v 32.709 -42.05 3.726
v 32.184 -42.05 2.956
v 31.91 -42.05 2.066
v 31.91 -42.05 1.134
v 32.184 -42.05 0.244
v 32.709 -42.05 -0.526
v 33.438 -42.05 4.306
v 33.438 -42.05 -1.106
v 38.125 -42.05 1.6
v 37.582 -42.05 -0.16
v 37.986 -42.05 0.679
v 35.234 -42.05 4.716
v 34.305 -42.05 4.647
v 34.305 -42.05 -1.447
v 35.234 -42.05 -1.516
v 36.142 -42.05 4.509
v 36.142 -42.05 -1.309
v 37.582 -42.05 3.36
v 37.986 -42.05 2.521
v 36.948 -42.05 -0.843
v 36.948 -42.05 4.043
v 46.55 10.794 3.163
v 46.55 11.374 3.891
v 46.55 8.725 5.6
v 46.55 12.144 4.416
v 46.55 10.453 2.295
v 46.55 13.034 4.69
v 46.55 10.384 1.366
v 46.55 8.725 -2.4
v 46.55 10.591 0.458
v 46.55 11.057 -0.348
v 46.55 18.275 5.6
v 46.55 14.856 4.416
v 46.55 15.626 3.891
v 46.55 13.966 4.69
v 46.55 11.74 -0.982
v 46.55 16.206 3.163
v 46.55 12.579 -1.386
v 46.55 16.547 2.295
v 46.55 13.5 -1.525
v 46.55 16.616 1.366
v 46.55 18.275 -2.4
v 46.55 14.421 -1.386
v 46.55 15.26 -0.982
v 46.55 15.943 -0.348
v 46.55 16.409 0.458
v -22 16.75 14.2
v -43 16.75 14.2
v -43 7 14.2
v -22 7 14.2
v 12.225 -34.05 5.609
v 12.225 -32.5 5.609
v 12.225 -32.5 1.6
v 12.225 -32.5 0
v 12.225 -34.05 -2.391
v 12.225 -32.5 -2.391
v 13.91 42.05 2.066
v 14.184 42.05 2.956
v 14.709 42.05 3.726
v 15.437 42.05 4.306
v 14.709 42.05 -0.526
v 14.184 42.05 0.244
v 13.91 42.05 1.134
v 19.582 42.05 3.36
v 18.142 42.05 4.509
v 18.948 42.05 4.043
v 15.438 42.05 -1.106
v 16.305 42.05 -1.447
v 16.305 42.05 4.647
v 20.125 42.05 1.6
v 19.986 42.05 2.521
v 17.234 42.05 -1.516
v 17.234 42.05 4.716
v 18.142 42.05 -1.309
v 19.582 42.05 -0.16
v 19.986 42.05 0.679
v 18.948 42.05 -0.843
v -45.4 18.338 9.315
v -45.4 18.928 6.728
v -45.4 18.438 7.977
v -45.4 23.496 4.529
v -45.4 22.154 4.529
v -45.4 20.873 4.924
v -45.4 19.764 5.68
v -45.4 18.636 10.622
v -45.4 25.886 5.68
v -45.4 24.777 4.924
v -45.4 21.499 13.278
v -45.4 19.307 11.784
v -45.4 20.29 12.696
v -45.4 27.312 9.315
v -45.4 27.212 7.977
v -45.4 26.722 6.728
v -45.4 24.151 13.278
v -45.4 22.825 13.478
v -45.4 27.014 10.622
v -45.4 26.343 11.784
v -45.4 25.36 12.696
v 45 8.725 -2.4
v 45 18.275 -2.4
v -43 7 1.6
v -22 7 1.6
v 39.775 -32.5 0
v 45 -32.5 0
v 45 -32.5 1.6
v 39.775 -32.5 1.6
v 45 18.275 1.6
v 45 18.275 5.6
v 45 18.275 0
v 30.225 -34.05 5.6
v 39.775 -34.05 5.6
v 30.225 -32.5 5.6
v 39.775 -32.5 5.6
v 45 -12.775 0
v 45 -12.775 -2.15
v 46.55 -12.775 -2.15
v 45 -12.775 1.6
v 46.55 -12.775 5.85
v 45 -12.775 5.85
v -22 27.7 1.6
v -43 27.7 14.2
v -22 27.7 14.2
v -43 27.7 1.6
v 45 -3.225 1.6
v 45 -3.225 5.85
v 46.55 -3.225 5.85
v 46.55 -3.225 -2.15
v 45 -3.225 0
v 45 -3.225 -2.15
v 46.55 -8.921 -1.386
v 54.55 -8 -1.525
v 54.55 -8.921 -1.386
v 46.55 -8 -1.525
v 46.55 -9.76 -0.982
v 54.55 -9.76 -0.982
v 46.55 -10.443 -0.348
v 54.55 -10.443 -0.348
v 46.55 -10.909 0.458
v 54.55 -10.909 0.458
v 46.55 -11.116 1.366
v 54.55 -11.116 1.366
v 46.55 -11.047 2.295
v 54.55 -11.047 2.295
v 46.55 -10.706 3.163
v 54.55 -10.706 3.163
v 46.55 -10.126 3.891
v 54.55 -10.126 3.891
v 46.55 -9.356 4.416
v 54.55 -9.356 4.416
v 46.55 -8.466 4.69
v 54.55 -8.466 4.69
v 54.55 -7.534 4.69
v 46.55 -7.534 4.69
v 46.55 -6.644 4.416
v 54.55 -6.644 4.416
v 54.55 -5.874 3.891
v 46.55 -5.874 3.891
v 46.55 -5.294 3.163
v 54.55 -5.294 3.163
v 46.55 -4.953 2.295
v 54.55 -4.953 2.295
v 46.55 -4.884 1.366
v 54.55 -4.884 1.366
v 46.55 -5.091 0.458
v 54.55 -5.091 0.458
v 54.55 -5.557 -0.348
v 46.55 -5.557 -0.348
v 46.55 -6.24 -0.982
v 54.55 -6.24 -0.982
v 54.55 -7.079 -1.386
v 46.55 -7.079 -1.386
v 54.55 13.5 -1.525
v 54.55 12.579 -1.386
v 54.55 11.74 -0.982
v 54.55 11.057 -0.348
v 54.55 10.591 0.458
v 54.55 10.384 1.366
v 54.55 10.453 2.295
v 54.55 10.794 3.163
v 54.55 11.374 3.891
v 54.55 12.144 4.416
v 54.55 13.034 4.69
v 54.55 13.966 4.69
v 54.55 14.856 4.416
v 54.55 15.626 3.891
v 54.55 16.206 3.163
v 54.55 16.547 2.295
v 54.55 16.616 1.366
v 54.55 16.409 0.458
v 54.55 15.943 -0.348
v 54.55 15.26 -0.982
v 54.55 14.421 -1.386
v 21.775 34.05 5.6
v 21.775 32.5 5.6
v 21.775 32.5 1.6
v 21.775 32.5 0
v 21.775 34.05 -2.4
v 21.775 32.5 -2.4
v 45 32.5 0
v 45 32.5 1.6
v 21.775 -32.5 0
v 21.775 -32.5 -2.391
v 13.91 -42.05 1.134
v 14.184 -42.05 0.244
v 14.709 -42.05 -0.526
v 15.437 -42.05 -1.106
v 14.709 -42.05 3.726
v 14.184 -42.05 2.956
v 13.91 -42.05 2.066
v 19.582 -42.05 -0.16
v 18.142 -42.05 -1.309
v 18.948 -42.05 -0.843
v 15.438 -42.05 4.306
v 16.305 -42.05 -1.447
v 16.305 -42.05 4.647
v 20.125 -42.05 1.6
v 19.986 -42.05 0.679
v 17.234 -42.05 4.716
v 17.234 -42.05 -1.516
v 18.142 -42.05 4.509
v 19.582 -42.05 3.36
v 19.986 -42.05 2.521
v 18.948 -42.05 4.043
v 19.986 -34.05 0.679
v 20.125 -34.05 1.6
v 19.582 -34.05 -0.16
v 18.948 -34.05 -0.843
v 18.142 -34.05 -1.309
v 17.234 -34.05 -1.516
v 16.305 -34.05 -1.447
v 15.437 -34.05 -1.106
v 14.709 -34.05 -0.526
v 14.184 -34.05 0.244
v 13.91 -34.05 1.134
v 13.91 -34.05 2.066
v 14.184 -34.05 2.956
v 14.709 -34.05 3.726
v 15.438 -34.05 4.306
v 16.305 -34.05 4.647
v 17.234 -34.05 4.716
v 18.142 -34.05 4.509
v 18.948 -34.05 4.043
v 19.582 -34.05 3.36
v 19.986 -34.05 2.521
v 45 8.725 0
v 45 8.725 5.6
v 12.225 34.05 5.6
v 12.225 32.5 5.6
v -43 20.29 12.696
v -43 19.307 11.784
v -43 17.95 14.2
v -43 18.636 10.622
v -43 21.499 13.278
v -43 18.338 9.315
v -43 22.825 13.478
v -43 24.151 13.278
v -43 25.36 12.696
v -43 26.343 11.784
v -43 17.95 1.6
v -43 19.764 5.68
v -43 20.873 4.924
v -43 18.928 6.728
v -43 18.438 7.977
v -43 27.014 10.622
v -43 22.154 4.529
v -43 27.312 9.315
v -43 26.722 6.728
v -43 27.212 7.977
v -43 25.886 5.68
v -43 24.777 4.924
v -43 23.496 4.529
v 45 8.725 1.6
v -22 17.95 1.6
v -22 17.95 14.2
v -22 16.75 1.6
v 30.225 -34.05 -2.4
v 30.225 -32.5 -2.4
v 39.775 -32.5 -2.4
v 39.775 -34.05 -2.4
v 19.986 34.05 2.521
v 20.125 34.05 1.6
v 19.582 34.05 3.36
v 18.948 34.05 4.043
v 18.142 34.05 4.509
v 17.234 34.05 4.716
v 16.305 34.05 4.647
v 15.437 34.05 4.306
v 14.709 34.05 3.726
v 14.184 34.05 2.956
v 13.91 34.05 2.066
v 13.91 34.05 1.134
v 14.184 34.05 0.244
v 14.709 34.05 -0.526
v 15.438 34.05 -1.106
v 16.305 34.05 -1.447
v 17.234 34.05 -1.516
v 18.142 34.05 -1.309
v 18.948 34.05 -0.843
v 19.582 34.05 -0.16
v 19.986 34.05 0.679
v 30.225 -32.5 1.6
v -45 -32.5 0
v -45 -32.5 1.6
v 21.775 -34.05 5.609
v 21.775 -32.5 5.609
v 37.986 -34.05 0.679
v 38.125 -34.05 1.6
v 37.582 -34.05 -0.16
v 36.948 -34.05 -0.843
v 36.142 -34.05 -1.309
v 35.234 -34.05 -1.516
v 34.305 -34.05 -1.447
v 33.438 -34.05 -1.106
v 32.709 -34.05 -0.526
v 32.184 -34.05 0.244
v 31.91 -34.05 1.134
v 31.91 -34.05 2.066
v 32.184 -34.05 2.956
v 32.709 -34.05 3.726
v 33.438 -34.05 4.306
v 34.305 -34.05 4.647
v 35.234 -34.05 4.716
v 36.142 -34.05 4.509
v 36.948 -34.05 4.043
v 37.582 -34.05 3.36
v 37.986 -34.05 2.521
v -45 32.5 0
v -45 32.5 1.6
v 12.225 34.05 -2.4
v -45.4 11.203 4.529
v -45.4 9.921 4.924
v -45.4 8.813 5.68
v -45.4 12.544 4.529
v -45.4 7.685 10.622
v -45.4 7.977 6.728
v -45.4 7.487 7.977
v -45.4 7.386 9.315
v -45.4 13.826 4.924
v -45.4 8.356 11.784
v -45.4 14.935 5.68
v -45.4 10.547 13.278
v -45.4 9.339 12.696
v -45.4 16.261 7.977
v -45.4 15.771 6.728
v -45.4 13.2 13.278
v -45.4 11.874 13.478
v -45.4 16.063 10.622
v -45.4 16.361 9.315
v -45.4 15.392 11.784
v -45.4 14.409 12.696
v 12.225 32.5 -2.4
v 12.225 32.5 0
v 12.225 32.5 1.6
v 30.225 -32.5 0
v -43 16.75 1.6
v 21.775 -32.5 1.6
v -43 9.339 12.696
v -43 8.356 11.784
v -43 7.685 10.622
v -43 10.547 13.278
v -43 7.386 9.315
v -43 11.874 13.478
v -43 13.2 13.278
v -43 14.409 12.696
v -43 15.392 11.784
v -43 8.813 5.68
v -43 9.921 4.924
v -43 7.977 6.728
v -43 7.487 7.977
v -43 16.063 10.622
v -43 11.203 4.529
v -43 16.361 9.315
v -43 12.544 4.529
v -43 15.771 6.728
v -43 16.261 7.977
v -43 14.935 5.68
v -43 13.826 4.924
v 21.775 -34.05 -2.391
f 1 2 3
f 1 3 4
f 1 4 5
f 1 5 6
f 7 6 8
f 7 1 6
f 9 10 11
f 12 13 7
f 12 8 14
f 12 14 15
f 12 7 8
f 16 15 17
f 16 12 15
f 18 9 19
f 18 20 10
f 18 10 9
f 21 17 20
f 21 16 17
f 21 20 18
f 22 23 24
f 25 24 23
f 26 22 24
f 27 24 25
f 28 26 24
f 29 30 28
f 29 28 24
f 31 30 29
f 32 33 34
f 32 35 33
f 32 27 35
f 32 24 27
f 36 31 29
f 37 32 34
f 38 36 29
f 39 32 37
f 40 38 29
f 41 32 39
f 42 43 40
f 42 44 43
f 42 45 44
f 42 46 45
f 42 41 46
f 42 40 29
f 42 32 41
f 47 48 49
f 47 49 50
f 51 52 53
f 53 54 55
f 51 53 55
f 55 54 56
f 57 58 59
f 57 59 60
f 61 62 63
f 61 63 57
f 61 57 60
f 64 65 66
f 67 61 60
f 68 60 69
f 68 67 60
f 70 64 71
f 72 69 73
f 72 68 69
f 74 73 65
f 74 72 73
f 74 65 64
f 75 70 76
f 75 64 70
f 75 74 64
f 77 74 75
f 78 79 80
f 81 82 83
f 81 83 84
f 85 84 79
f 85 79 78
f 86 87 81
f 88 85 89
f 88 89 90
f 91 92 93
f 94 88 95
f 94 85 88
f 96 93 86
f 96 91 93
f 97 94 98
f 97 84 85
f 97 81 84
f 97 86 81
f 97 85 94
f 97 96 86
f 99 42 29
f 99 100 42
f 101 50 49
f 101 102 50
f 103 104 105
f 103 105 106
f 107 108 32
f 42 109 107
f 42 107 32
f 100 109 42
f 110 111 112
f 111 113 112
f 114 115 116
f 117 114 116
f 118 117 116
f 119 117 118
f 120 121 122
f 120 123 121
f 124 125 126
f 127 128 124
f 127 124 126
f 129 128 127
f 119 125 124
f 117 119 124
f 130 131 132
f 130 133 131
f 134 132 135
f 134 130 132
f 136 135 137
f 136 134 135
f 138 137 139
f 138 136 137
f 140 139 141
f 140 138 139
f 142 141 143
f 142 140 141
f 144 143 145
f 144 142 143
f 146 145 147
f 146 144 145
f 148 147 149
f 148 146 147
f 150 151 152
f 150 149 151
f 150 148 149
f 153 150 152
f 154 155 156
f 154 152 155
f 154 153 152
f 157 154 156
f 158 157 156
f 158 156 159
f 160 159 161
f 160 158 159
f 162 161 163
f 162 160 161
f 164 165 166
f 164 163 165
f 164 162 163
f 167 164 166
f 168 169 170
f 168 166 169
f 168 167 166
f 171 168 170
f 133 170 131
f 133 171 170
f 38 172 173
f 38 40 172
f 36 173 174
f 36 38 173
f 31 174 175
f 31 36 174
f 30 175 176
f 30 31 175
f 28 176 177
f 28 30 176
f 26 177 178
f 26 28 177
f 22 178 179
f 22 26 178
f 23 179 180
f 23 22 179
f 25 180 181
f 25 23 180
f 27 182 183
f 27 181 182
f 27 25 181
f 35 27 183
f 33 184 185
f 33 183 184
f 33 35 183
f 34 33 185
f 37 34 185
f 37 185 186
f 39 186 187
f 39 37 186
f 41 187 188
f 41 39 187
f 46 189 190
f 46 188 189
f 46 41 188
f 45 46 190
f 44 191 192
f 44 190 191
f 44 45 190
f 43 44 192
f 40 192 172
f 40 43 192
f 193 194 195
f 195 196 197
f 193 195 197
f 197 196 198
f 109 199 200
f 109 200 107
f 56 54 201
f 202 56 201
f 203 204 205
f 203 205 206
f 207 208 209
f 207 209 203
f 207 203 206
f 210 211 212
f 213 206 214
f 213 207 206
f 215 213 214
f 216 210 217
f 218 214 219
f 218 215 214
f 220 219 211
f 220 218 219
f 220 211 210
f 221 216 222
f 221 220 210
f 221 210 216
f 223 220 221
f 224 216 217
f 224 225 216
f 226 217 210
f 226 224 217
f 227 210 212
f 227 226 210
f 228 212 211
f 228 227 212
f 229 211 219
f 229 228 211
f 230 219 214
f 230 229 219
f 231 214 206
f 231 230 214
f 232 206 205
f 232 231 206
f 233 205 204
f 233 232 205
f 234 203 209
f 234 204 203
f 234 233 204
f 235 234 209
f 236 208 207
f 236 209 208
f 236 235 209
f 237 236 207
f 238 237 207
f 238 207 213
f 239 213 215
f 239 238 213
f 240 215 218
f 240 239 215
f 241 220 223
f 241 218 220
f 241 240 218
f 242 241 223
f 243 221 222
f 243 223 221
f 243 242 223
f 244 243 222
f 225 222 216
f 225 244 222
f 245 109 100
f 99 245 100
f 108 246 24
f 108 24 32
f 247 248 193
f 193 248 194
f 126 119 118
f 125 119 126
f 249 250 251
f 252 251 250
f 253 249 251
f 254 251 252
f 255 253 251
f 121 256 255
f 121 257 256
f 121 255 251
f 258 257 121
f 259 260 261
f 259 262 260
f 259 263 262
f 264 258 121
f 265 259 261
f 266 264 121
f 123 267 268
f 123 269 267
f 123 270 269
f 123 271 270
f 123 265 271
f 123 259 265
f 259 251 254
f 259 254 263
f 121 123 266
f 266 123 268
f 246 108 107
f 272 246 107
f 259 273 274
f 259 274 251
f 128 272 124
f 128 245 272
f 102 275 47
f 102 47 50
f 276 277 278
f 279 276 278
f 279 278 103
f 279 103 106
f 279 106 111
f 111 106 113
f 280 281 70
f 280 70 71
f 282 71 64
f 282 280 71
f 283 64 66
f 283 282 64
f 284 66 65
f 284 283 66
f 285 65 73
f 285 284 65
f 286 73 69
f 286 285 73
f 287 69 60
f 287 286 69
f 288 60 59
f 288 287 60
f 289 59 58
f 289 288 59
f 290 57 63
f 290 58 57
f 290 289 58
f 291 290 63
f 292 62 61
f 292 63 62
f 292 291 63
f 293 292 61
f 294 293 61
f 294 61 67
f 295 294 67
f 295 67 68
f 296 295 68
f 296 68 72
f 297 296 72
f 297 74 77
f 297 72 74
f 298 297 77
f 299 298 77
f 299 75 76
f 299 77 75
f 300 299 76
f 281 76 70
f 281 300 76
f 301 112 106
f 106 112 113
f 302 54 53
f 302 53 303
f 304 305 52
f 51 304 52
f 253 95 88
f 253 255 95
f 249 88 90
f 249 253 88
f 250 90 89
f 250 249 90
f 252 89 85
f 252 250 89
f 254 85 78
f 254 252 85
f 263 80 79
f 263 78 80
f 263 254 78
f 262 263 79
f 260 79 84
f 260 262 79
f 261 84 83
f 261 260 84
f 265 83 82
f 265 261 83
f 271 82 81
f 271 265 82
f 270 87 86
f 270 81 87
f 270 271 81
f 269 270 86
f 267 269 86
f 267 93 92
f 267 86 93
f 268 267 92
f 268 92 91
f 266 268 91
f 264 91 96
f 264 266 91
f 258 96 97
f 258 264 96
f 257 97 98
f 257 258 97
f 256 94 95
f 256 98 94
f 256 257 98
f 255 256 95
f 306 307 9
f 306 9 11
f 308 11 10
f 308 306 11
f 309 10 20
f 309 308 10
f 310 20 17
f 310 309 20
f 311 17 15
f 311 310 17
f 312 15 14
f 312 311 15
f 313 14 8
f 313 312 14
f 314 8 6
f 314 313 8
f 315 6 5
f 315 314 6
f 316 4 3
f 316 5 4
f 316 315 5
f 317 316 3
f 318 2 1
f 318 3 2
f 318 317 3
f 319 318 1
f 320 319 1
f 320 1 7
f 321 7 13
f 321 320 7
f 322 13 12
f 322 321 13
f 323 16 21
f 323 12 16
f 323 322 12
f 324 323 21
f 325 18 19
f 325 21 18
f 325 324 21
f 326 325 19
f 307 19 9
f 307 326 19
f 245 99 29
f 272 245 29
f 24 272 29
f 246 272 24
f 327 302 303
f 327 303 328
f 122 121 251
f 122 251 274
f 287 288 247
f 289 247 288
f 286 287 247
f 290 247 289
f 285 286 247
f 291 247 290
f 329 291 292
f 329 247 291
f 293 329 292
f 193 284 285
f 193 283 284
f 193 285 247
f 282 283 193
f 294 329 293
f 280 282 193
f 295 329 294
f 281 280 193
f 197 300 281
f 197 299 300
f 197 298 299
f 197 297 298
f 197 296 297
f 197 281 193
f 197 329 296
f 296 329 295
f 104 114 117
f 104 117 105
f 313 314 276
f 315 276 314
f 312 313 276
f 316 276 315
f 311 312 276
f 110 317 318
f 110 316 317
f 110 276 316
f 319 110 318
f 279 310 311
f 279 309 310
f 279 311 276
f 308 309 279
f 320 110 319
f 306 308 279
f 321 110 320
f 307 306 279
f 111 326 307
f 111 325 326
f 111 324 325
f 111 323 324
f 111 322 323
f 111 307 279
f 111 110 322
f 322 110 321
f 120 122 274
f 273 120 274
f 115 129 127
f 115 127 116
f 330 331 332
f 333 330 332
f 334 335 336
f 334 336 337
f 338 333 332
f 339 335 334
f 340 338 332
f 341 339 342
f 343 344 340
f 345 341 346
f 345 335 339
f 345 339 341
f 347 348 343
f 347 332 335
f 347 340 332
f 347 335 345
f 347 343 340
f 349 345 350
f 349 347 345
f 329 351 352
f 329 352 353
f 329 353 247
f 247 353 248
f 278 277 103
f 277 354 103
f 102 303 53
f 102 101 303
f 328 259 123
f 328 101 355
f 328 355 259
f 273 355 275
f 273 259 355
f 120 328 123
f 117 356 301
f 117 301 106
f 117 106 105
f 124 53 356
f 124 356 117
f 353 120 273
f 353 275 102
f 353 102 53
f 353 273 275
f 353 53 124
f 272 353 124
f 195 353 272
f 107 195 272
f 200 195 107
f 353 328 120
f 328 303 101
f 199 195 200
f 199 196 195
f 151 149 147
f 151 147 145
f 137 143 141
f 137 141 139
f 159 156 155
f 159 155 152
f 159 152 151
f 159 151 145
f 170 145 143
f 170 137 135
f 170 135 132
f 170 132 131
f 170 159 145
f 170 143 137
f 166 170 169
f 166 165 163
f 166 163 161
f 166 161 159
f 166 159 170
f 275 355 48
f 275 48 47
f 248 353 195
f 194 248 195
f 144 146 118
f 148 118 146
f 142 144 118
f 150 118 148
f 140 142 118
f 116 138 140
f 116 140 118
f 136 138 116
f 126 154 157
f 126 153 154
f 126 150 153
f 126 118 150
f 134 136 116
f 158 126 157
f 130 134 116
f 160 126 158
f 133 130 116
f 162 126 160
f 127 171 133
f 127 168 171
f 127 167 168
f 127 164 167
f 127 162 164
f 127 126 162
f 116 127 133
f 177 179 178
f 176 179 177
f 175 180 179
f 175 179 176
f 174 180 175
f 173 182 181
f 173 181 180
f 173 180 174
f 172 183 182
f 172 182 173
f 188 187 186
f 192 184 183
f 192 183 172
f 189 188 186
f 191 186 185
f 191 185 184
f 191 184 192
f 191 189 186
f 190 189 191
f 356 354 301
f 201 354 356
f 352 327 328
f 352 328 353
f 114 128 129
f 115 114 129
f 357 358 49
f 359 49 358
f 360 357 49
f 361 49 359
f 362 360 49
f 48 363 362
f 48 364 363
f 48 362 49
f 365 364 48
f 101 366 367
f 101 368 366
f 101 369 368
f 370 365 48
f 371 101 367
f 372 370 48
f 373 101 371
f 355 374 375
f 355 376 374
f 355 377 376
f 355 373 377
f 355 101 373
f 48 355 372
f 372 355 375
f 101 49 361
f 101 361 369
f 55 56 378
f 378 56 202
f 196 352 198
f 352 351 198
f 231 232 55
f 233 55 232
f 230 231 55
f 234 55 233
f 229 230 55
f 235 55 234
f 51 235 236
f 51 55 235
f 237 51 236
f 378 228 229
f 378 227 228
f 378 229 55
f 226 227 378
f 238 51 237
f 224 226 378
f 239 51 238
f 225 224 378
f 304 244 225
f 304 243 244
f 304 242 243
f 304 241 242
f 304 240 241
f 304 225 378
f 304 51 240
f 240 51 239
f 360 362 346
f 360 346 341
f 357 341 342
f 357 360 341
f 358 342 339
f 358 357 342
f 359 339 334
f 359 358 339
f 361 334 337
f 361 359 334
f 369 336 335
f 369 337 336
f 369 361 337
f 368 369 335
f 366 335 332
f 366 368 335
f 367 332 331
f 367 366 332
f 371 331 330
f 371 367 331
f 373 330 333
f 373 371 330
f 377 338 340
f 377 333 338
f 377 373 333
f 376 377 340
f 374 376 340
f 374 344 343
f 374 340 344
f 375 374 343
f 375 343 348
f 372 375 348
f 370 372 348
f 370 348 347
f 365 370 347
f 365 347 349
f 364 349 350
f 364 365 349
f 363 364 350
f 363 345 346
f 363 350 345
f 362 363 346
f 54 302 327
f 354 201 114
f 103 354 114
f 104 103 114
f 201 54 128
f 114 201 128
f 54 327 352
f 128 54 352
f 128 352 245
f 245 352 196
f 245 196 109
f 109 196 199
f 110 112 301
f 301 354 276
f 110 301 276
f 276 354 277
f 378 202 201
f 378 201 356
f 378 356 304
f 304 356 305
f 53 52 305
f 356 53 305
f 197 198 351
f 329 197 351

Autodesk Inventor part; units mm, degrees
ref_plane "YZ Plane" through (0, 0, 0) normal (1, 0, 0) x (0, 1, 0)
ref_plane "XZ Plane" through (0, 0, 0) normal (0, 1, 0) x (-1, 0, 0)
ref_plane "XY Plane" through (0, 0, 0) normal (0, 0, 1) x (1, 0, 0)
sketch "Sketch1" plane through (0, 0, 0) normal (0, 0, 1) x (1, 0, 0)
  line L0 (-45, 32.5) -> (45, 32.5)
  line L1 (45, 32.5) -> (45, -32.5)
  line L2 (45, -32.5) -> (-45, -32.5)
  line L3 (-45, -32.5) -> (-45, 32.5)
  line L4 (-45, 32.5) -> (45, -32.5) construction
  line L5 (45, 32.5) -> (-45, -32.5) construction
  point P0 (0, 0)
  dimension "d0" = 90
  dimension "d1" = 65
extrude "Extrusion1" add sketch "Sketch1" along normal blind 1.6
sketch "Sketch2" plane through (0, 0, 1.6) normal (0, 0, 1) x (1, 0, 0)
  point P0 (0, 0)
sketch "Sketch3" plane through (-45, 32.5, 0) normal (0, 1, 0) x (1, 0, 0)
  point P0 (45, 0)
sketch "Sketch4" plane through (-45, 32.5, 0) normal (0, 1, 0) x (1, 0, 0)
  line L0 (57.225, -5.6) -> (66.775, -5.6)
  line L1 (66.775, -5.6) -> (66.775, 2.4)
  line L2 (66.775, 2.4) -> (57.225, 2.4)
  line L3 (57.225, 2.4) -> (57.225, -5.6)
  line L4 (90, -1.6) -> (0, -1.6) projected
  line L5 (57.225, -5.6) -> (66.775, 2.4) construction
  line L6 (66.775, -5.6) -> (57.225, 2.4) construction
  point P0 (45, 0)
  point P1 (62, -1.6)
  dimension "d4" = 9.55
  dimension "d5" = 8
  dimension "d8" = 62
extrude "Extrusion2" add sketch "Sketch4" along normal blind 1.55
sketch "Sketch5" plane through (45, -32.5, 0) normal (1, 0, 0) x (0, 0, -1)
  line L0 (-5.6, 50.775) -> (2.4, 50.775)
  line L1 (2.4, 50.775) -> (2.4, 41.225)
  line L2 (2.4, 41.225) -> (-5.6, 41.225)
  line L3 (-5.6, 41.225) -> (-5.6, 50.775)
  line L4 (-1.6, 0) -> (-1.6, 65) projected
  line L5 (-5.6, 50.775) -> (2.4, 41.225) construction
  line L6 (2.4, 50.775) -> (-5.6, 41.225) construction
  line L7 (-5.8505, 29.275) -> (2.1495, 29.275)
  line L8 (2.1495, 29.275) -> (2.1495, 19.725)
  line L9 (2.1495, 19.725) -> (-5.8505, 19.725)
  line L10 (-5.8505, 19.725) -> (-5.8505, 29.275)
  line L11 (-5.8505, 29.275) -> (2.1495, 19.725) construction
  line L12 (2.1495, 29.275) -> (-5.8505, 19.725) construction
  point P0 (0, 32.5)
  point P1 (-1.6, 46)
  point P2 (-1.8505, 24.5)
  dimension "d9" = 9.55
  dimension "d10" = 8
  dimension "d11" = 19
  dimension "d12" = 24.5
extrude "Extrusion3" add sketch "Sketch5" along normal blind 1.55
sketch "Sketch6" plane through (-45, -32.5, 0) normal (0, -1, 0) x (1, 0, 0)
  line L0 (66.775, 5.6091) -> (57.225, 5.6091)
  line L1 (57.225, 5.6091) -> (57.225, -2.3909)
  line L2 (57.225, -2.3909) -> (66.775, -2.3909)
  line L3 (66.775, -2.3909) -> (66.775, 5.6091)
  line L4 (66.775, 5.6091) -> (57.225, -2.3909) construction
  line L5 (57.225, 5.6091) -> (66.775, -2.3909) construction
  line L6 (84.775, 5.6) -> (75.225, 5.6)
  line L7 (75.225, 5.6) -> (75.225, -2.4)
  line L8 (75.225, -2.4) -> (84.775, -2.4)
  line L9 (84.775, -2.4) -> (84.775, 5.6)
  line L10 (0, 1.6) -> (90, 1.6) projected
  line L11 (84.775, 5.6) -> (75.225, -2.4) construction
  line L12 (75.225, 5.6) -> (84.775, -2.4) construction
  point P0 (45, 0)
  point P1 (62, 1.6091)
  point P2 (80, 1.6)
  dimension "d15" = 10
  dimension "d16" = 28
  dimension "d17" = 8
  dimension "d18" = 9.55
extrude "Extrusion4" add sketch "Sketch6" along normal blind 1.55
sketch "Sketch7" plane through (0, 0, 1.6) normal (0, 0, 1) x (1, 0, 0)
  line L0 (-43, 27.7) -> (-22, 27.7)
  line L1 (-22, 27.7) -> (-22, 17.95)
  line L2 (-22, 17.95) -> (-43, 17.95)
  line L3 (-43, 17.95) -> (-43, 27.7)
  line L4 (-43, 27.7) -> (-22, 17.95) construction
  line L5 (-22, 27.7) -> (-43, 17.95) construction
  line L6 (-43, 16.75) -> (-22, 16.75)
  line L7 (-22, 16.75) -> (-22, 7)
  line L8 (-22, 7) -> (-43, 7)
  line L9 (-43, 7) -> (-43, 16.75)
  line L10 (-43, 16.75) -> (-22, 7) construction
  line L11 (-22, 16.75) -> (-43, 7) construction
  line L12 (12.225, 32.5) -> (-45, 32.5) projected
  line L13 (-45, 32.5) -> (-45, -32.5) projected
  point P0 (0, 0)
  point P1 (-32.5, 22.825)
  point P2 (-32.5, 11.875)
  dimension "d21" = 21
  dimension "d22" = 9.75
  dimension "d23" = 25.5
  dimension "d24" = 4.8
  dimension "d25" = 2
extrude "Extrusion5" add sketch "Sketch7" along normal blind 12.6
sketch "Sketch8" plane through (-43, 17.95, 1.6) normal (-1, 0, 0) x (0, 0, 1)
  circle A0 centre (7.3783, 4.875) radius 4.5
  circle A1 centre (7.3783, -6.0762) radius 4.5
  point P0 (-1.6, -17.95)
  dimension "d28" = 9
extrude "Extrusion6" add sketch "Sketch8" along normal blind 2.4
sketch "Sketch9" plane through (-45, -34.05, 0) normal (0, -1, 0) x (1, 0, 0)
  line L0 (66.775, 5.6091) -> (57.225, 5.6091) construction
  line L1 (62, 5.6091) -> (62, -2.3909) construction
  line L2 (57.225, -2.3909) -> (66.775, -2.3909) construction
  line L3 (57.225, 1.6) -> (66.775, 1.6) construction
  line L4 (57.225, 1.6) -> (66.775, 1.6) construction
  line L5 (84.775, 5.6) -> (75.225, 5.6) construction
  line L6 (80, 5.6) -> (80, -3.4898) construction
  line L7 (75.225, 0) -> (75.225, 1.6) construction
  line L8 (75.225, 1.6) -> (84.775, 1.6) construction
  line L9 (75.225, 1.6) -> (84.775, 1.6) construction
  circle A0 centre (62, 1.6) radius 3.125
  circle A1 centre (80, 1.6) radius 3.125
  point P0 (45, 0)
  dimension "d31" = 6.25
extrude "Extrusion7" add sketch "Sketch9" along normal blind 8
sketch "Sketch10" plane through (46.55, -32.5, 0) normal (1, 0, 0) x (0, 0, -1)
  line L0 (-5.6, 50.775) -> (-5.6, 41.225) construction
  line L1 (-5.6, 46) -> (2.4, 46) construction
  line L2 (2.4, 41.225) -> (2.4, 50.775) construction
  line L3 (-5.8505, 29.275) -> (-5.8505, 19.725) construction
  line L4 (-5.8505, 24.5) -> (2.1495, 24.5) construction
  line L5 (2.1495, 29.275) -> (2.1495, 19.725) construction
  line L6 (-1.6, 50.775) -> (0, 50.775) construction
  line L7 (-1.6, 39.5) -> (-1.6, 49.25) construction
  line L8 (-1.6, 50.775) -> (-1.6, 39.5) construction
  line L9 (-1.6, 65) -> (-1.6, 0) construction
  line L10 (-1.6, 29.275) -> (-1.6, 19.725) construction
  circle A0 centre (-1.6, 46) radius 3.125
  circle A1 centre (-1.6, 24.5) radius 3.125
  point P0 (0, 32.5)
  dimension "d34" = 6.25
extrude "Extrusion8" add sketch "Sketch10" along normal blind 8
sketch "Sketch11" plane through (-45, 34.05, 0) normal (0, 1, 0) x (1, 0, 0)
  line L0 (66.775, -5.6091) -> (57.225, -5.6091) construction
  line L1 (62, -5.6091) -> (62, 2.3909) construction
  line L2 (57.225, 2.3909) -> (66.775, 2.3909) construction
  line L3 (57.225, -1.6) -> (66.775, -1.6) construction
  line L4 (57.225, -1.6) -> (66.775, -1.6) construction
  circle A0 centre (62, -1.6) radius 3.125
  point P0 (45, 0)
  dimension "d37" = 6.25
extrude "Extrusion9" add sketch "Sketch11" along normal blind 8
properties part number "ADF41020-EVB"
